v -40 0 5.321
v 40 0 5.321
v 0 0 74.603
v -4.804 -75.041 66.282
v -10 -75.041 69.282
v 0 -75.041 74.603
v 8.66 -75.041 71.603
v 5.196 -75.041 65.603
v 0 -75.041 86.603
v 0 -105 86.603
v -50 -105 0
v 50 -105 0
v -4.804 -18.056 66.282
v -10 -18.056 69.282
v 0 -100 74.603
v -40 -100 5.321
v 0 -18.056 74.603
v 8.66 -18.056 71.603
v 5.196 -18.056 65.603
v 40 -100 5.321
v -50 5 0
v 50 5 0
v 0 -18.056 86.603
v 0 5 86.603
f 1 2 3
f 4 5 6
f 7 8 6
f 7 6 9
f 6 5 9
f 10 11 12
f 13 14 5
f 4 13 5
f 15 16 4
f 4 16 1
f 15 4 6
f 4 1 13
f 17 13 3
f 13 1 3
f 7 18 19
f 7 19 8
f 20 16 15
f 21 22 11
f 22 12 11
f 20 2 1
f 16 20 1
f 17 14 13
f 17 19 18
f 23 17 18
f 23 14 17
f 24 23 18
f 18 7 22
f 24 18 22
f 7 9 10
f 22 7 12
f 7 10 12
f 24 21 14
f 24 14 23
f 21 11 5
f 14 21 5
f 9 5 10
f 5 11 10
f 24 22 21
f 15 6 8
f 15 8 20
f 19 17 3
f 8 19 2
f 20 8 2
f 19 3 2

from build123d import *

# Parameters (mm, degrees)
F1_DEPTH = 100
F3_DEPTH = 5
F5_DEPTH = 5
F6_W     = 56.985039264
F6_H     = 20
F7_DEPTH = 15


with BuildPart() as f1:
    # F0 (on Front) → F1 (new body)
    with BuildSketch(Plane.XZ):
        Polygon((0, 86.6025403784), (-50, 0), (50, 0), align=None)
        Polygon((40, 5.3205080757), (-40, 5.3205080757), (0, 74.6025403784), align=None, mode=Mode.SUBTRACT)
    extrude(amount=F1_DEPTH)

    # F2 (on face) → F3 (join)
    with BuildSketch(Plane.XZ.offset(100)):
        Polygon((-50, 0), (50, 0), (0, 86.6025403784), align=None)
        Polygon((0, 74.6025403784), (40, 5.3205080757), (-40, 5.3205080757), align=None, mode=Mode.SUBTRACT)
        Polygon((-40, 5.3205080757), (40, 5.3205080757), (0, 74.6025403784), align=None)
    extrude(amount=F3_DEPTH)

    # F4 (on face) → F5 (join)
    with BuildSketch(Plane(origin=(0, 0, 0), x_dir=(-1, 0, 0), z_dir=(0, 1, 0))):
        Polygon((0, 86.6025403784), (-50, 0), (50, 0), align=None)
        Polygon((0, 74.6025403784), (40, 5.3205080757), (-40, 5.3205080757), align=None, mode=Mode.SUBTRACT)
        Polygon((-40, 5.3205080757), (40, 5.3205080757), (0, 74.6025403784), align=None)
    extrude(amount=F5_DEPTH)

    # F6 (on face) → F7 (cut)
    with BuildSketch(Plane(origin=(-37.5, 0, 21.6506350946), x_dir=(0, -1, 0), z_dir=(-0.8660254038, 0, 0.5))):
        with Locations((46.5483199805, 65)):
            Rectangle(F6_W, F6_H)
    extrude(amount=-F7_DEPTH, mode=Mode.SUBTRACT)


solid = f1.part
